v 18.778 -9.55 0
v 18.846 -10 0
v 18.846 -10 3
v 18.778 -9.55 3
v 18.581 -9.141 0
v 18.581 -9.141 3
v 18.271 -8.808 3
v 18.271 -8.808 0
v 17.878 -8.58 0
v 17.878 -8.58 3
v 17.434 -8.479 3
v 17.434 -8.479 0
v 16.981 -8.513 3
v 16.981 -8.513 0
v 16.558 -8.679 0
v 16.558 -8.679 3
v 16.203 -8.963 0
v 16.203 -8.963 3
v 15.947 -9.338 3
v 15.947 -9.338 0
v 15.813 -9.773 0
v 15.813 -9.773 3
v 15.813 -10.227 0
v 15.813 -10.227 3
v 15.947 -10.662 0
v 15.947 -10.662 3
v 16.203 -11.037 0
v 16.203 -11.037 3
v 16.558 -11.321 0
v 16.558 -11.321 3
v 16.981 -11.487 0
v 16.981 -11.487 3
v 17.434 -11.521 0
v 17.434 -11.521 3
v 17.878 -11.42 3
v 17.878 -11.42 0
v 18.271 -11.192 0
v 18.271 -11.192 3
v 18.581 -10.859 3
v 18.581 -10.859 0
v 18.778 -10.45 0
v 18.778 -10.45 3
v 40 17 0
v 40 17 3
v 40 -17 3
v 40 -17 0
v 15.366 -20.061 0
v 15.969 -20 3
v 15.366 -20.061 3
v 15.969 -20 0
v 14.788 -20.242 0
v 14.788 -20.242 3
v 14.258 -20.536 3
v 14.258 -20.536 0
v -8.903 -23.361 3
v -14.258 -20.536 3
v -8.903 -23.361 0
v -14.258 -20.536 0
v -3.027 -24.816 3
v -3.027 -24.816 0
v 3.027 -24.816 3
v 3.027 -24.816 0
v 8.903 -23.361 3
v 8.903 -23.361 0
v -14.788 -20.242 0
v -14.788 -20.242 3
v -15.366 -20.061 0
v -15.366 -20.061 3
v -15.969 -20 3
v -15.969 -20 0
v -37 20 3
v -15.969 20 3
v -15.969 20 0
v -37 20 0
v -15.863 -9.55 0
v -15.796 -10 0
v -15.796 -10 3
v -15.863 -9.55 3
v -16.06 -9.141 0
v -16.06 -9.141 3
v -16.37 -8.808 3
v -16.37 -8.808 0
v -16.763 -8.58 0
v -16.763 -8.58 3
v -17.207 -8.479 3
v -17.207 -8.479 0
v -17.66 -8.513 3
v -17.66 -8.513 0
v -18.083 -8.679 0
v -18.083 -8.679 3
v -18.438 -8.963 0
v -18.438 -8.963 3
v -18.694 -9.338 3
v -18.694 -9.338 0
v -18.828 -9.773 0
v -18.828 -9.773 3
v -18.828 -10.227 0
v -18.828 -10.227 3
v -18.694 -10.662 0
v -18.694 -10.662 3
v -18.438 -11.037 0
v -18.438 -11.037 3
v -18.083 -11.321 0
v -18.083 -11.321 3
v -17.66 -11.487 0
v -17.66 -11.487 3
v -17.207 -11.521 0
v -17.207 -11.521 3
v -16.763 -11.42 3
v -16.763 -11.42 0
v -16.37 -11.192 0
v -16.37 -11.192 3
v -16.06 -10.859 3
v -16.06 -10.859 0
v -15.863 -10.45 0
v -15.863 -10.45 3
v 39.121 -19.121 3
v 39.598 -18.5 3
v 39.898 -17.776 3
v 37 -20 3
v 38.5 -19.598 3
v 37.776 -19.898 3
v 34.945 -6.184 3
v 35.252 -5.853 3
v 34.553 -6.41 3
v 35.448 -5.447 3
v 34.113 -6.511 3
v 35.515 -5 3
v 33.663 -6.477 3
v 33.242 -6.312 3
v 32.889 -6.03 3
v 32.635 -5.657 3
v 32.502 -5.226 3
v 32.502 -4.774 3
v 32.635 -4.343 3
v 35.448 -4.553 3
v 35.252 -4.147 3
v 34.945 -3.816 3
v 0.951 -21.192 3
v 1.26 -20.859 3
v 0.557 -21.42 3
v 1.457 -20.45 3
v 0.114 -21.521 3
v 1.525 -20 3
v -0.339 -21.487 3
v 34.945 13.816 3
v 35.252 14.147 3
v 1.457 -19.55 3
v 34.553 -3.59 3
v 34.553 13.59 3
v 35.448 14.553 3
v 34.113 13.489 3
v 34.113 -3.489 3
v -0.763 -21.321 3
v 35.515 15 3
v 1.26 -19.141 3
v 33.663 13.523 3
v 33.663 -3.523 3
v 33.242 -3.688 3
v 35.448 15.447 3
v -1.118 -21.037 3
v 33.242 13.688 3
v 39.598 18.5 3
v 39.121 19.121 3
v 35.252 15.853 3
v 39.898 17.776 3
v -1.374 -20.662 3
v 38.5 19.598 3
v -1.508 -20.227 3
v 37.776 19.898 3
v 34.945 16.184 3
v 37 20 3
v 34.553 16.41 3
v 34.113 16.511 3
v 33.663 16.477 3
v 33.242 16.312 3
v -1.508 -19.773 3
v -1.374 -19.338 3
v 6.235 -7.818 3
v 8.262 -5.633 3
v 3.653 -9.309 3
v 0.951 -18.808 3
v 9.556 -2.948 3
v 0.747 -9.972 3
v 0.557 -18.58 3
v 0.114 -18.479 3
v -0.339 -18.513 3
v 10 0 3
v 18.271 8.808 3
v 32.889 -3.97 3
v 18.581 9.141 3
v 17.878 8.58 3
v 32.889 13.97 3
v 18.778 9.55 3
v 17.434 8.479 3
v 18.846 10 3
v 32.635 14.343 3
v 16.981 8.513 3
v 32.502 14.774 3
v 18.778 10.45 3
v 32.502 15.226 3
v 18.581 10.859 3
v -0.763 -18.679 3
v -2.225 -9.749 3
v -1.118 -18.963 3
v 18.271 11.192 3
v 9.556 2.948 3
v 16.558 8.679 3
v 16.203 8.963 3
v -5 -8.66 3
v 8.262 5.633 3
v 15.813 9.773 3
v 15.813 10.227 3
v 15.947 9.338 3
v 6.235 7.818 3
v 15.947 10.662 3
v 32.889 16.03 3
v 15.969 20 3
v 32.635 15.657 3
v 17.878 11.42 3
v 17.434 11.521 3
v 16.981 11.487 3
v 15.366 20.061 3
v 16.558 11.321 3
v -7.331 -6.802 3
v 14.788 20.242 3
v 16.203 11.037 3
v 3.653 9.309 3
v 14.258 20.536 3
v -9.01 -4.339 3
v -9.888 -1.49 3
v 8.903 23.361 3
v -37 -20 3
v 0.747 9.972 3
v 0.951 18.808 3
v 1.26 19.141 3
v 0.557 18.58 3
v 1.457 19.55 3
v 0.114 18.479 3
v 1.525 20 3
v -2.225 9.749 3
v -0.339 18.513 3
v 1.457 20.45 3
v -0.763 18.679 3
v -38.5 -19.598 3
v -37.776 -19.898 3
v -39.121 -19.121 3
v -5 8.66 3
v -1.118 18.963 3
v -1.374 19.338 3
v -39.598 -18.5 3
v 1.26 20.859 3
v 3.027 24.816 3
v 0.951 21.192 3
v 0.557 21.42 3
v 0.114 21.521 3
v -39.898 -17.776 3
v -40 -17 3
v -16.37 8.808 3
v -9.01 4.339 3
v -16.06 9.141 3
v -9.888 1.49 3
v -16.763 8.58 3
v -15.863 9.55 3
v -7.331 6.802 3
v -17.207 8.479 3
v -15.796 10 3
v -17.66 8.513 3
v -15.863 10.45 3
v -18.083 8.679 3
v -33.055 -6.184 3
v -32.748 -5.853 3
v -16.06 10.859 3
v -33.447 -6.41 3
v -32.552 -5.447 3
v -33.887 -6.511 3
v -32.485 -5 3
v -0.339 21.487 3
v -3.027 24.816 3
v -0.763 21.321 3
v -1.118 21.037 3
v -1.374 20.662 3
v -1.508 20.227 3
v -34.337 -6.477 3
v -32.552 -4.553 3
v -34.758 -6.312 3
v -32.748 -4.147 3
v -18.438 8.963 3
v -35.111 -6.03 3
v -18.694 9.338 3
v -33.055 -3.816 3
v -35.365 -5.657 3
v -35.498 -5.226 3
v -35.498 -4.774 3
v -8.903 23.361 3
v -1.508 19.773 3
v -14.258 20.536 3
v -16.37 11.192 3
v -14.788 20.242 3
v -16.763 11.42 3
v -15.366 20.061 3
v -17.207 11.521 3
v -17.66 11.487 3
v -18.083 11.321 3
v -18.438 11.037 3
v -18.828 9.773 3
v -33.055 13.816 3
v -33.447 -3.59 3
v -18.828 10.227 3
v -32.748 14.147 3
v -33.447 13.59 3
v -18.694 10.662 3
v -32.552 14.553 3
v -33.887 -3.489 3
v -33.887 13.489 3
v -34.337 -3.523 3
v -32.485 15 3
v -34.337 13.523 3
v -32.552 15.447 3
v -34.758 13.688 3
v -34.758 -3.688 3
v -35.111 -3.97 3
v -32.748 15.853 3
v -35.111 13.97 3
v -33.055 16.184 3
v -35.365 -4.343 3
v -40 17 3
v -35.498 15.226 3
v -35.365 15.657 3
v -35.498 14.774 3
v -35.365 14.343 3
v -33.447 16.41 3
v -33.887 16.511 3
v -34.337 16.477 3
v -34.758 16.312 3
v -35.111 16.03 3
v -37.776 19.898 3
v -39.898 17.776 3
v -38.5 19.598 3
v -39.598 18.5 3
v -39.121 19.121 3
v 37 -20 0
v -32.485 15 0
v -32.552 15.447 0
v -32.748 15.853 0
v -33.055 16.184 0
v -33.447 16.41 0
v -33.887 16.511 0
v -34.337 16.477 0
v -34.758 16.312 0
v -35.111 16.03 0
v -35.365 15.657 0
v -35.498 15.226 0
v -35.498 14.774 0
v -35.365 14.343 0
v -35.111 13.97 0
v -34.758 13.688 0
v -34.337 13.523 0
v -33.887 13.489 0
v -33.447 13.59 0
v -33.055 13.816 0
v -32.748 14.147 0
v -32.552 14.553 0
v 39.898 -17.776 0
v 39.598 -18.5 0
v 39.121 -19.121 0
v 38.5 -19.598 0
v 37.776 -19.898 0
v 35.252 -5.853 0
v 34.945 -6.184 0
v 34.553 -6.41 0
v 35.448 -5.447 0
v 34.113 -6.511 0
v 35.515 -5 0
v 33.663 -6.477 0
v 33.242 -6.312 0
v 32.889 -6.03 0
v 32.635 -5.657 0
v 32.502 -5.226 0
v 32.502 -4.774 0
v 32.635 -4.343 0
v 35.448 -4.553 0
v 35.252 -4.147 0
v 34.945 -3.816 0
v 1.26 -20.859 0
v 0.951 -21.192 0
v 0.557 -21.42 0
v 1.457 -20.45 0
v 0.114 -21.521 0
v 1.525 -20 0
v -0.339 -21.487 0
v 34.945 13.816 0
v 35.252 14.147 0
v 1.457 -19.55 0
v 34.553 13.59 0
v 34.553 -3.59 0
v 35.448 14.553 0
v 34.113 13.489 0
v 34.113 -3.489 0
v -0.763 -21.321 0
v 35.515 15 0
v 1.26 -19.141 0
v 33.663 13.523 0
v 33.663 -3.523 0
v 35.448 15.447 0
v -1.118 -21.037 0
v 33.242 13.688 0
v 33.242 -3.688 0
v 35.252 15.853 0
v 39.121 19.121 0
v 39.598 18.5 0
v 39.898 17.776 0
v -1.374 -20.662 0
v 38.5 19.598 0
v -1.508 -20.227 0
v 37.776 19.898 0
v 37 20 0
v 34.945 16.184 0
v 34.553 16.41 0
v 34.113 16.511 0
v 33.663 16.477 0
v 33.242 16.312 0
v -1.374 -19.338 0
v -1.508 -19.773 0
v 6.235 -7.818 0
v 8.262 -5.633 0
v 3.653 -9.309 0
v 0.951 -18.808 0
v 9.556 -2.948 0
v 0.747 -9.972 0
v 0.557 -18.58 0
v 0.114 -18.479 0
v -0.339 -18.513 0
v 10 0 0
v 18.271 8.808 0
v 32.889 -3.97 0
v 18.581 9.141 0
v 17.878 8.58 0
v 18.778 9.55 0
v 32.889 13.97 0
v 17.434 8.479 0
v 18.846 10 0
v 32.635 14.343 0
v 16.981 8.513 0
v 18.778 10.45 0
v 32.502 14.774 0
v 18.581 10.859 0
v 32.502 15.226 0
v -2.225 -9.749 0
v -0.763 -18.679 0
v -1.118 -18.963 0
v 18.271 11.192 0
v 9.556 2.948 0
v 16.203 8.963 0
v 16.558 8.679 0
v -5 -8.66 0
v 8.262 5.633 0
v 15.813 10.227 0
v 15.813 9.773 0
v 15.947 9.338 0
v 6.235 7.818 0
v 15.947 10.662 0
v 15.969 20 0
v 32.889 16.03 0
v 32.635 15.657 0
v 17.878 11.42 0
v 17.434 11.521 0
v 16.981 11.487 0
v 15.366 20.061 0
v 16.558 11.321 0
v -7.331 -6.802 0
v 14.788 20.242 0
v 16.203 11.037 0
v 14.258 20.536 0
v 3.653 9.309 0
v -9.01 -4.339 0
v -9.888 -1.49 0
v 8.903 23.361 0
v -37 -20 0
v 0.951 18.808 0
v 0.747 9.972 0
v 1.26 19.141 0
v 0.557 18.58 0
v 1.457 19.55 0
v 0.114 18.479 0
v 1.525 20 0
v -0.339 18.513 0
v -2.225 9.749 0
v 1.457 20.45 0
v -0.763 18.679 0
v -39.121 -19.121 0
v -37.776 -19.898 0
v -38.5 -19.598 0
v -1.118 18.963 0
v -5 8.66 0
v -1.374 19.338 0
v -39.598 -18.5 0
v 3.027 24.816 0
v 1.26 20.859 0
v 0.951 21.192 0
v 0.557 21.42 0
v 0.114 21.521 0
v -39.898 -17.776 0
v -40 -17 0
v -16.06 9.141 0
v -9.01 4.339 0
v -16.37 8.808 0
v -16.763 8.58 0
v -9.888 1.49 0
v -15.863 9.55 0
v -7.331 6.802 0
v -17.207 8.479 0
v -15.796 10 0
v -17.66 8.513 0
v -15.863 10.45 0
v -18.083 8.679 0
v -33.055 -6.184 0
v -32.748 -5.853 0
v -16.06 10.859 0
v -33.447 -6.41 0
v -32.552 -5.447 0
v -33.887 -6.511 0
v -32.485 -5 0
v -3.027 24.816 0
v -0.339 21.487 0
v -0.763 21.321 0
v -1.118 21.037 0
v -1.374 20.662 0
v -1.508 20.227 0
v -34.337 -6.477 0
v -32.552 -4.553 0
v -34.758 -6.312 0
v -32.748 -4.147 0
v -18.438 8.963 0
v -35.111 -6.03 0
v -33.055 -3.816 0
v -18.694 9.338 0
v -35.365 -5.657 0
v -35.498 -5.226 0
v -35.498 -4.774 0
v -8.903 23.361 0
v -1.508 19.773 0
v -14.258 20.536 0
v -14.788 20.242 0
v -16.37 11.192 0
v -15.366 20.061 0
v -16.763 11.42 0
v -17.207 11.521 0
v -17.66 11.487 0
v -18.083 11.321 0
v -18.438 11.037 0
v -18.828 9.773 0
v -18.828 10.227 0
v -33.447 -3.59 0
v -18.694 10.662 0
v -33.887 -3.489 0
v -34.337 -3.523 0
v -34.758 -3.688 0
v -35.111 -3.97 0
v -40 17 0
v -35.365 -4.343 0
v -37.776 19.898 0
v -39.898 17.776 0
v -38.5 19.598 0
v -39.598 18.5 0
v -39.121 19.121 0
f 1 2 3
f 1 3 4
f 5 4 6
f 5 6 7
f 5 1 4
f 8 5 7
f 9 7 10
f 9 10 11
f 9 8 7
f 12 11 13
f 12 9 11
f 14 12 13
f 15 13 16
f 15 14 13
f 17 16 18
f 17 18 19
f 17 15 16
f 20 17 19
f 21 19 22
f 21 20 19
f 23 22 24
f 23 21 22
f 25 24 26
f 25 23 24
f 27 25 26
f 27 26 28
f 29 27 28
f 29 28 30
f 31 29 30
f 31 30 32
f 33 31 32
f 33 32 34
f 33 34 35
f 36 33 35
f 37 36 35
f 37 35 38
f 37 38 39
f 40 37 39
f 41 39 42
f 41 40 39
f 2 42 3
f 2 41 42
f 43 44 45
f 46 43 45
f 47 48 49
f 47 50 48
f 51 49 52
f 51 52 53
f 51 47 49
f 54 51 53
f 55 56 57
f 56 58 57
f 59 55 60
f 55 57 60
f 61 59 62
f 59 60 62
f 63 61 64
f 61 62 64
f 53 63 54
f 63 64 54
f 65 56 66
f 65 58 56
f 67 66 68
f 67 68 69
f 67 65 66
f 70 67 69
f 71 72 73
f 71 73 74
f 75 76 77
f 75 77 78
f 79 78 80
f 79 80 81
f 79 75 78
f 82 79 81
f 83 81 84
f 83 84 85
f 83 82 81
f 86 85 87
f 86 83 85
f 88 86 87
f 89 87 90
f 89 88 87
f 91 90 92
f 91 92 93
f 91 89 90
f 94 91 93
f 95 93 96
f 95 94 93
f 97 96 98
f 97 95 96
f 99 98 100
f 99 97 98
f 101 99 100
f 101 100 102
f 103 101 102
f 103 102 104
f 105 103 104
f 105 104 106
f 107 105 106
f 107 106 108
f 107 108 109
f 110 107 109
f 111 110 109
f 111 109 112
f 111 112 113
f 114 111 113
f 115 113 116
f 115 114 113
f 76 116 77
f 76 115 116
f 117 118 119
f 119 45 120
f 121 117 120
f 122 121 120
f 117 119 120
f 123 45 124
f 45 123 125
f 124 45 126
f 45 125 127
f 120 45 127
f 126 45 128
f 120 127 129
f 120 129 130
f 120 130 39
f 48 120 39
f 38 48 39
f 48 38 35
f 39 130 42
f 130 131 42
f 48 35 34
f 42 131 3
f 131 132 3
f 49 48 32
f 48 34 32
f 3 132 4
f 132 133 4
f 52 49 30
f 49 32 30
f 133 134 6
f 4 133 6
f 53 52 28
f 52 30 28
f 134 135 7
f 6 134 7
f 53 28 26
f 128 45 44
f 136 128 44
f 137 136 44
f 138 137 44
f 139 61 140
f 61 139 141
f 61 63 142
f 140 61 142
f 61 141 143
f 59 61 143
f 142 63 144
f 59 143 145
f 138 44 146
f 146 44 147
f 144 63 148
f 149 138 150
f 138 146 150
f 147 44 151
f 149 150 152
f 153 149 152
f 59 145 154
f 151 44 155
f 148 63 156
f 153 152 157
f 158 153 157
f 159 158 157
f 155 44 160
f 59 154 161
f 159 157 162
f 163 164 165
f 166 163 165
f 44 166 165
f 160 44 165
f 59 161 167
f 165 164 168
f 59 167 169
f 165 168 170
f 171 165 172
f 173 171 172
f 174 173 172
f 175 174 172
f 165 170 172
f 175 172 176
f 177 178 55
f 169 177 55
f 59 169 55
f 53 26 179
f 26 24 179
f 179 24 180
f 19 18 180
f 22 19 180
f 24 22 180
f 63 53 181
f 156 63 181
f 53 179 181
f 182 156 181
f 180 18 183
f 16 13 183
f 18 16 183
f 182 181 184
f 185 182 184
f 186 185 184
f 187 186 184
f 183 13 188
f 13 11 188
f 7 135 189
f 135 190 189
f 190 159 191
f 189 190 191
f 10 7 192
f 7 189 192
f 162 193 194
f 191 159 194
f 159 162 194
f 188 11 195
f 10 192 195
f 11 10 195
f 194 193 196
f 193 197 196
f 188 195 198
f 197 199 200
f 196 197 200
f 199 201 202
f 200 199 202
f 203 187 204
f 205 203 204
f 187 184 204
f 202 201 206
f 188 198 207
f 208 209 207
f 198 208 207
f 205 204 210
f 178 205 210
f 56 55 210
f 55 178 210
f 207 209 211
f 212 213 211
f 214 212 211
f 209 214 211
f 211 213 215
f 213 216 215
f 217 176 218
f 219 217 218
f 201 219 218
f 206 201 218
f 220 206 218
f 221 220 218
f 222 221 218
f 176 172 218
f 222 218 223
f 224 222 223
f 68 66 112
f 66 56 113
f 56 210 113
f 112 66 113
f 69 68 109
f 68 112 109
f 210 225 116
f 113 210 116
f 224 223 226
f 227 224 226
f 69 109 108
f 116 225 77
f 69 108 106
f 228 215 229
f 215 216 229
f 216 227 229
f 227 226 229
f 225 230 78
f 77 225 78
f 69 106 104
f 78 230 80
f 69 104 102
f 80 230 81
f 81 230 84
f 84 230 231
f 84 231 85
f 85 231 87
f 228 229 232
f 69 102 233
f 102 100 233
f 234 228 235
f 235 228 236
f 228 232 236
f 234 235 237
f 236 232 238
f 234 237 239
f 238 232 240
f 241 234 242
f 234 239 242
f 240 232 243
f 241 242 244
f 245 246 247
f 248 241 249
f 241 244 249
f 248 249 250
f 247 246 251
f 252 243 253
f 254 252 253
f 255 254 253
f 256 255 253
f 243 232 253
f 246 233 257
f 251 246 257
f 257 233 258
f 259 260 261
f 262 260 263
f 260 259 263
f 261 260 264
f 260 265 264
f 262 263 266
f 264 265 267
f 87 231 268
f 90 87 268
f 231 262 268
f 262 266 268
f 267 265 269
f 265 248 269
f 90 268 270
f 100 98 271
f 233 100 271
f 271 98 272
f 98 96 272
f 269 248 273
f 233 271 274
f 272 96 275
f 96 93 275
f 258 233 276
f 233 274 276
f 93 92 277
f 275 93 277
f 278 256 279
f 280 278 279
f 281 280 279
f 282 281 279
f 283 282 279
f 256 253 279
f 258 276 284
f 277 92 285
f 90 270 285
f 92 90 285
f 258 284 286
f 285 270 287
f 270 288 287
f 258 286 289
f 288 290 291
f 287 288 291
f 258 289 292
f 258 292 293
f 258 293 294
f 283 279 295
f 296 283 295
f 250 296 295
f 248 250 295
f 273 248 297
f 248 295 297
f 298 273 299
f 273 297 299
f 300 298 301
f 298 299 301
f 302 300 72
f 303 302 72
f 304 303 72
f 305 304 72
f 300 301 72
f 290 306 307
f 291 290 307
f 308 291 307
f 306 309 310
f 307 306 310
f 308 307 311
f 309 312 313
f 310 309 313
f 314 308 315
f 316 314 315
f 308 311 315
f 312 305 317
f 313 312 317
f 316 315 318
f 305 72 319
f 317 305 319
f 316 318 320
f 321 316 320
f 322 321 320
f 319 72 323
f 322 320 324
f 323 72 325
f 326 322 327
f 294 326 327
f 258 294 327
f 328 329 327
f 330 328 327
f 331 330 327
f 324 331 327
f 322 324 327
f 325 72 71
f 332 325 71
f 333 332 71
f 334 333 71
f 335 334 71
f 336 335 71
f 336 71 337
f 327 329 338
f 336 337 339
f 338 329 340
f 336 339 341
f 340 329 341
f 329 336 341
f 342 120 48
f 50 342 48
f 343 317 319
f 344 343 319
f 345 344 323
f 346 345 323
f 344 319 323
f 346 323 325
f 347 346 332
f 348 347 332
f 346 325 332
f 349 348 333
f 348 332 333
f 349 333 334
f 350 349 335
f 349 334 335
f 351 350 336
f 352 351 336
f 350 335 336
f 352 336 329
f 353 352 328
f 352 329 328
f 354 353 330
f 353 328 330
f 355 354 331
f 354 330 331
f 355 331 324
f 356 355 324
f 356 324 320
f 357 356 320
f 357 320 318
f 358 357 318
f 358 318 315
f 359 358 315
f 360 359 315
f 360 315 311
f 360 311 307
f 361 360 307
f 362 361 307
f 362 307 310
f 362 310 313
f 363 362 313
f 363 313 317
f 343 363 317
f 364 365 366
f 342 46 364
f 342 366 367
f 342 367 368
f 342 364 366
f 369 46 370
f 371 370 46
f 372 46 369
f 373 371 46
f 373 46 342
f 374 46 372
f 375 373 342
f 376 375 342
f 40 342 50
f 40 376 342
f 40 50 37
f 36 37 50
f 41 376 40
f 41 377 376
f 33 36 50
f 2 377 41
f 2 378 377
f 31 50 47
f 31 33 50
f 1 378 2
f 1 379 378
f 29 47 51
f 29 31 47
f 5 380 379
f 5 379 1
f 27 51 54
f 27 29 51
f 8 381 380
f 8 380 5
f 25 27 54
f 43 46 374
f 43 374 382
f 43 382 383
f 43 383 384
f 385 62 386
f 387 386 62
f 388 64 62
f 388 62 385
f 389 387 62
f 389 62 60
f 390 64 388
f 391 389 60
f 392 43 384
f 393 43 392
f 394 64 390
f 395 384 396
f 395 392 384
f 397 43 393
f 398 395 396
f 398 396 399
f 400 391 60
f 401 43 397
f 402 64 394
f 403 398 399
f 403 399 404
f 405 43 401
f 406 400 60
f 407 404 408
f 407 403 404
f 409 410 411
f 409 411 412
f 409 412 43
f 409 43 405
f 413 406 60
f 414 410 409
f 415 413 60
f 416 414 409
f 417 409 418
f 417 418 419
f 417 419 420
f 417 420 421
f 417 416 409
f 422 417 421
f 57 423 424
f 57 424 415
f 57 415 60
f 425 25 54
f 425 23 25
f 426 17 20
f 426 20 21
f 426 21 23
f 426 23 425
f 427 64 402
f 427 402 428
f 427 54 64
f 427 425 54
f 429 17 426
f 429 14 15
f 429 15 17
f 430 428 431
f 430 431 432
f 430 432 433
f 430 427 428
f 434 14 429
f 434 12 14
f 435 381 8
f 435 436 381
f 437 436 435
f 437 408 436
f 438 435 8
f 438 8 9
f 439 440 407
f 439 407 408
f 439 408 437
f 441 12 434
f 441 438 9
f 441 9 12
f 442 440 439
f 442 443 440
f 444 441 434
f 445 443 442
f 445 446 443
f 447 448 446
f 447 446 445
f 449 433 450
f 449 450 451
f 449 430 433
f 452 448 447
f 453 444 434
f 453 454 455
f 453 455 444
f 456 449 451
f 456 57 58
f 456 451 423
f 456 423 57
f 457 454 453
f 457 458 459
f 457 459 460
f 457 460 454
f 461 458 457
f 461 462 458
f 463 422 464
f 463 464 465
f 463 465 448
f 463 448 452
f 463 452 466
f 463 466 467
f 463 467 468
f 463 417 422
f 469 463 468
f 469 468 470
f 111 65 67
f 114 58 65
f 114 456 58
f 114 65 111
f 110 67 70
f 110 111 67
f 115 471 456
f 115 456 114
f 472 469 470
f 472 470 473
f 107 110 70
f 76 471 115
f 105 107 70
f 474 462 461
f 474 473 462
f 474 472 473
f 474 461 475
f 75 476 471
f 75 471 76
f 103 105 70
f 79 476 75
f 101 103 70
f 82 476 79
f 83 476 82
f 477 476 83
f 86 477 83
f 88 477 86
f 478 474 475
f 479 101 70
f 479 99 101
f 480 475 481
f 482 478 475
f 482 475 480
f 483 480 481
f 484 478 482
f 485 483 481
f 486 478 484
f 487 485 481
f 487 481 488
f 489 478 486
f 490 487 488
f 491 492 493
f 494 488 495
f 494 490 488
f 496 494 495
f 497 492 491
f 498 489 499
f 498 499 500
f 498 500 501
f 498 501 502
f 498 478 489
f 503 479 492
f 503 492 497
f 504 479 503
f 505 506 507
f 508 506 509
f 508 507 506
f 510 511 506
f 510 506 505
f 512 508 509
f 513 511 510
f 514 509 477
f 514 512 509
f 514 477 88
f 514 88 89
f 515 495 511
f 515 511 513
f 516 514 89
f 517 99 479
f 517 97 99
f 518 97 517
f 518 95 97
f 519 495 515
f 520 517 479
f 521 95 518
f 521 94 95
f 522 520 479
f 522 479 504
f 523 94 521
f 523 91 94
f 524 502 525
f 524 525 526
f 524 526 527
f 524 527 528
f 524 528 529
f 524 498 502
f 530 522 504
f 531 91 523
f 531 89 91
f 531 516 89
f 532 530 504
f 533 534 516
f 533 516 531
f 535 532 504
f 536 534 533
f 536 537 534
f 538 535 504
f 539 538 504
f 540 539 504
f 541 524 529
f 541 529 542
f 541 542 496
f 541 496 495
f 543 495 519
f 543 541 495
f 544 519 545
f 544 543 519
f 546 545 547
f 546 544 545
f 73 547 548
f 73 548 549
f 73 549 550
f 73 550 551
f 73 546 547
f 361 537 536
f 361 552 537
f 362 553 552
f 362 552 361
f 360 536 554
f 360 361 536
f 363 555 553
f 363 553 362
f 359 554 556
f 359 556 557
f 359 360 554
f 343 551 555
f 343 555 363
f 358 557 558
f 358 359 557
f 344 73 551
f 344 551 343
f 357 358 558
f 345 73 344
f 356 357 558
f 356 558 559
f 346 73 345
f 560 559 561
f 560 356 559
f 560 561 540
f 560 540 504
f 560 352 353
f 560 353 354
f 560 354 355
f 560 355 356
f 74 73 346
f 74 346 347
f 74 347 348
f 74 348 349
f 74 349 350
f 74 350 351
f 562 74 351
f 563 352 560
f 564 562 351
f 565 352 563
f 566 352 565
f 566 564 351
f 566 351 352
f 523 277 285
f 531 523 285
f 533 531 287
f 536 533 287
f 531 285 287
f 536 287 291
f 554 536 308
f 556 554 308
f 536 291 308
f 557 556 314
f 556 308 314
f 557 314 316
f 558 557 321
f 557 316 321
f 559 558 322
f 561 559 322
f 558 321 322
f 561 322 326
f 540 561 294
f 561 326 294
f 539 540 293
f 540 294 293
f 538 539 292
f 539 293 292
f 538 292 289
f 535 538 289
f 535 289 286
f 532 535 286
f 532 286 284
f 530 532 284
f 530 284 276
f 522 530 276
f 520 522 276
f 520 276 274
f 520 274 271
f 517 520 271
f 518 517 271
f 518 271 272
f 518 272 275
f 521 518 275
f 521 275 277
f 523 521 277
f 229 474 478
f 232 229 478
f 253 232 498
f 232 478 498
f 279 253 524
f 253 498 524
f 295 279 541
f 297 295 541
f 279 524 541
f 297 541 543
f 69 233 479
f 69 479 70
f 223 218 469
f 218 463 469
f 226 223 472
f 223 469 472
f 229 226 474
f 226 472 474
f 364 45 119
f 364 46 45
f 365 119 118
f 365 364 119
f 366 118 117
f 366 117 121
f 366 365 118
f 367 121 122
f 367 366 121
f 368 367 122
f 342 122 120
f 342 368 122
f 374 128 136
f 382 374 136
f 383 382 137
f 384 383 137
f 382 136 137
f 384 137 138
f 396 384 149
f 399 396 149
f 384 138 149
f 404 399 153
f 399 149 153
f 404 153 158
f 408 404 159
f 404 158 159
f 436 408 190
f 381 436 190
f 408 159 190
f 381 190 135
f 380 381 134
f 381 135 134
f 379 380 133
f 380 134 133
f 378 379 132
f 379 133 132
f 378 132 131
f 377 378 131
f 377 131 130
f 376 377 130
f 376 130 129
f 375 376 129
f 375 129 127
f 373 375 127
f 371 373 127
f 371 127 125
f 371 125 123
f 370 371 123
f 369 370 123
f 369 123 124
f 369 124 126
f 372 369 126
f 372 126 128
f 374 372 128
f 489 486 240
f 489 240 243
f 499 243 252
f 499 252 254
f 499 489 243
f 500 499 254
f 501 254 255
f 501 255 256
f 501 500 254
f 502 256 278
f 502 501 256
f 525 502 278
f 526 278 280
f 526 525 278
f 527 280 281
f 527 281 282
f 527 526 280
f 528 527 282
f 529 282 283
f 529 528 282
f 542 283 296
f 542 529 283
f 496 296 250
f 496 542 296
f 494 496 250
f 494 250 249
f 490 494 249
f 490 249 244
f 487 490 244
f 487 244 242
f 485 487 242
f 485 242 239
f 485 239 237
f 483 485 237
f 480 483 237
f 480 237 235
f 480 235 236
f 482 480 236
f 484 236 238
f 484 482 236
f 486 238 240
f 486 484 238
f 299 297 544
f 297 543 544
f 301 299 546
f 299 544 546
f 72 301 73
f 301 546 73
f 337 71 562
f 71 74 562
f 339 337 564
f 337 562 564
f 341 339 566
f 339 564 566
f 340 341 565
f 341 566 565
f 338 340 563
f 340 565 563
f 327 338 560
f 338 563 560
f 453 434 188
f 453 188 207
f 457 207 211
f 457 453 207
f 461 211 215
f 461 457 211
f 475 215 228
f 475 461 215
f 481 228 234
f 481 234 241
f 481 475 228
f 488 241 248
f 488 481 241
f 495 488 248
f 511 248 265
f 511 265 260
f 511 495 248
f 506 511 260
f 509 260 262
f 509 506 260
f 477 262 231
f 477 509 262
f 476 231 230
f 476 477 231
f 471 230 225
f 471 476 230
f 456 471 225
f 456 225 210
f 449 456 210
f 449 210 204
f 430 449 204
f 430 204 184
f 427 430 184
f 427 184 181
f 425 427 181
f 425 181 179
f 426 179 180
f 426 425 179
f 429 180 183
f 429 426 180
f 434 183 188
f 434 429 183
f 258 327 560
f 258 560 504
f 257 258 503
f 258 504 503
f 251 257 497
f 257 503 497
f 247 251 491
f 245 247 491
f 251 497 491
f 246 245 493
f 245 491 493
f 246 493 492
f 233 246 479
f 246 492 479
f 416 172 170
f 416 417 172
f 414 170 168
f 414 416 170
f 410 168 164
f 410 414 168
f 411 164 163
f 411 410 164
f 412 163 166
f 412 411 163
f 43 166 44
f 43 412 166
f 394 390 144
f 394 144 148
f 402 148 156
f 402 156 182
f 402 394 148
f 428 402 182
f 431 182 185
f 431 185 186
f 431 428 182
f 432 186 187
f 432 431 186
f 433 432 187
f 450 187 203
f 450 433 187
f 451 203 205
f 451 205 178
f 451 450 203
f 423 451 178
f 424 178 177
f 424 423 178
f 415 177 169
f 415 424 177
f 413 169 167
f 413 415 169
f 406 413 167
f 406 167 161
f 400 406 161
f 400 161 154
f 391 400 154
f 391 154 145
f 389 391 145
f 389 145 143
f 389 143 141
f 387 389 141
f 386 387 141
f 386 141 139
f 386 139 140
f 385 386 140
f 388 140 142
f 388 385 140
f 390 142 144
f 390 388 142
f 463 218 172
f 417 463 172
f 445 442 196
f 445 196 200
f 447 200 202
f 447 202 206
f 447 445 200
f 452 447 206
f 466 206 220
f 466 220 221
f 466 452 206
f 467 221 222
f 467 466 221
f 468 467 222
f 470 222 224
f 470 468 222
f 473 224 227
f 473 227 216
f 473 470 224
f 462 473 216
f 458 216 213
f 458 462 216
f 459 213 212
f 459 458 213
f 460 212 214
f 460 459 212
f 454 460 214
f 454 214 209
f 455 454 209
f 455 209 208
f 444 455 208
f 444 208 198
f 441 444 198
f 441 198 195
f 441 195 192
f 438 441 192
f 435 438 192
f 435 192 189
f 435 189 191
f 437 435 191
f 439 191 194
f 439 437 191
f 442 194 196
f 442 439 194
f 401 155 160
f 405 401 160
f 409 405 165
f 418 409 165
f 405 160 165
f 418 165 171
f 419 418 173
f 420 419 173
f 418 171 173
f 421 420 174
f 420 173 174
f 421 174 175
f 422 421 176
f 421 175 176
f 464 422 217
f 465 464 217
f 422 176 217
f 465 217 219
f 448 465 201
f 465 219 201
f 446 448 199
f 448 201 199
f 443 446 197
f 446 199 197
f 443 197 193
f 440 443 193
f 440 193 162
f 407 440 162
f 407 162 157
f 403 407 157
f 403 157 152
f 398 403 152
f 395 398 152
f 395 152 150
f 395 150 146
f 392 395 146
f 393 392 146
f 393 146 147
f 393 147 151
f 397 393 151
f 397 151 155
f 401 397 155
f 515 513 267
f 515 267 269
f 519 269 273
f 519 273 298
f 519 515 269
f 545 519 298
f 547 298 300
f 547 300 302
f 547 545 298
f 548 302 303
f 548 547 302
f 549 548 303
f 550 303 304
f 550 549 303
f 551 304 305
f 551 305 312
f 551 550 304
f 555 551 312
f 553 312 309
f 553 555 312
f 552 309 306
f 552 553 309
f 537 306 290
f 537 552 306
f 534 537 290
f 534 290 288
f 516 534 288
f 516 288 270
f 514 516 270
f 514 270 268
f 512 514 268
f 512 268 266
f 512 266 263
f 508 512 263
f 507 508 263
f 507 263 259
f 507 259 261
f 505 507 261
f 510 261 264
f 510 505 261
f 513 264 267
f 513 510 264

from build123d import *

# Parameters (mm, degrees)
SKETCH_1_R          = 25
SKETCH_1_R_2        = 1.525
SKETCH_1_R_3        = 10
EXTRUDE_1_DEPTH     = 3
EXTRUDE_2_DEPTH     = 3
FILLET_1_R          = 3
SKETCH_4_R          = 1.515
CUT_EXTRUDE_1_DEPTH = 10


with BuildPart() as part:
    # 草图1 → 凸台-拉伸1 (new body)
    with BuildSketch(Plane.XY):
        Circle(SKETCH_1_R)
        with Locations((0, 20)):
            Circle(SKETCH_1_R_2, mode=Mode.SUBTRACT)
        with Locations((17.320508076, 10)):
            Circle(SKETCH_1_R_2, mode=Mode.SUBTRACT)
        with Locations((17.320508076, -10)):
            Circle(SKETCH_1_R_2, mode=Mode.SUBTRACT)
        with Locations((0, -20)):
            Circle(SKETCH_1_R_2, mode=Mode.SUBTRACT)
        Circle(SKETCH_1_R_3, mode=Mode.SUBTRACT)
        with Locations((-17.320508076, -10)):
            Circle(SKETCH_1_R_2, mode=Mode.SUBTRACT)
        with Locations((-17.320508076, 10)):
            Circle(SKETCH_1_R_2, mode=Mode.SUBTRACT)
    extrude(amount=EXTRUDE_1_DEPTH)

    # 草图3 → 凸台-拉伸2 (add)
    with BuildSketch(Plane.XY.offset(3)):
        with BuildLine():
            Line((15, 20), (40, 20))
            Line((40, 20), (40, -20))
            Line((40, -20), (15, -20))
            ThreePointArc((15, -20), (25, 0), (15, 20))
        make_face()
        with BuildLine():
            Line((-40, -20), (-15, -20))
            ThreePointArc((-15, -20), (-25, 0), (-15, 20))
            Line((-15, 20), (-40, 20))
            Line((-40, 20), (-40, -20))
        make_face()
    extrude(amount=-EXTRUDE_2_DEPTH)

    # 圆角1
    fillet_1_edges = [part.edges().sort_by_distance(p)[0] for p in [
        (40, 20, 1.5),
        (40, -20, 1.5),
        (15, -20, 1.5),
        (15, 20, 1.5),
        (-40, -20, 1.5),
        (-40, 20, 1.5),
        (-15, 20, 1.5),
        (-15, -20, 1.5),
    ]]
    fillet(fillet_1_edges, radius=FILLET_1_R)

    # 草图4 → 切除-拉伸1 (cut)
    with BuildSketch(Plane.XY.offset(3)):
        with Locations((-34, 15)):
            Circle(SKETCH_4_R)
        with Locations((-34, -5)):
            Circle(SKETCH_4_R)
        with Locations((34, -5)):
            Circle(SKETCH_4_R)
        with Locations((34, 15)):
            Circle(SKETCH_4_R)
    extrude(amount=-CUT_EXTRUDE_1_DEPTH, mode=Mode.SUBTRACT)


solid = part.part
